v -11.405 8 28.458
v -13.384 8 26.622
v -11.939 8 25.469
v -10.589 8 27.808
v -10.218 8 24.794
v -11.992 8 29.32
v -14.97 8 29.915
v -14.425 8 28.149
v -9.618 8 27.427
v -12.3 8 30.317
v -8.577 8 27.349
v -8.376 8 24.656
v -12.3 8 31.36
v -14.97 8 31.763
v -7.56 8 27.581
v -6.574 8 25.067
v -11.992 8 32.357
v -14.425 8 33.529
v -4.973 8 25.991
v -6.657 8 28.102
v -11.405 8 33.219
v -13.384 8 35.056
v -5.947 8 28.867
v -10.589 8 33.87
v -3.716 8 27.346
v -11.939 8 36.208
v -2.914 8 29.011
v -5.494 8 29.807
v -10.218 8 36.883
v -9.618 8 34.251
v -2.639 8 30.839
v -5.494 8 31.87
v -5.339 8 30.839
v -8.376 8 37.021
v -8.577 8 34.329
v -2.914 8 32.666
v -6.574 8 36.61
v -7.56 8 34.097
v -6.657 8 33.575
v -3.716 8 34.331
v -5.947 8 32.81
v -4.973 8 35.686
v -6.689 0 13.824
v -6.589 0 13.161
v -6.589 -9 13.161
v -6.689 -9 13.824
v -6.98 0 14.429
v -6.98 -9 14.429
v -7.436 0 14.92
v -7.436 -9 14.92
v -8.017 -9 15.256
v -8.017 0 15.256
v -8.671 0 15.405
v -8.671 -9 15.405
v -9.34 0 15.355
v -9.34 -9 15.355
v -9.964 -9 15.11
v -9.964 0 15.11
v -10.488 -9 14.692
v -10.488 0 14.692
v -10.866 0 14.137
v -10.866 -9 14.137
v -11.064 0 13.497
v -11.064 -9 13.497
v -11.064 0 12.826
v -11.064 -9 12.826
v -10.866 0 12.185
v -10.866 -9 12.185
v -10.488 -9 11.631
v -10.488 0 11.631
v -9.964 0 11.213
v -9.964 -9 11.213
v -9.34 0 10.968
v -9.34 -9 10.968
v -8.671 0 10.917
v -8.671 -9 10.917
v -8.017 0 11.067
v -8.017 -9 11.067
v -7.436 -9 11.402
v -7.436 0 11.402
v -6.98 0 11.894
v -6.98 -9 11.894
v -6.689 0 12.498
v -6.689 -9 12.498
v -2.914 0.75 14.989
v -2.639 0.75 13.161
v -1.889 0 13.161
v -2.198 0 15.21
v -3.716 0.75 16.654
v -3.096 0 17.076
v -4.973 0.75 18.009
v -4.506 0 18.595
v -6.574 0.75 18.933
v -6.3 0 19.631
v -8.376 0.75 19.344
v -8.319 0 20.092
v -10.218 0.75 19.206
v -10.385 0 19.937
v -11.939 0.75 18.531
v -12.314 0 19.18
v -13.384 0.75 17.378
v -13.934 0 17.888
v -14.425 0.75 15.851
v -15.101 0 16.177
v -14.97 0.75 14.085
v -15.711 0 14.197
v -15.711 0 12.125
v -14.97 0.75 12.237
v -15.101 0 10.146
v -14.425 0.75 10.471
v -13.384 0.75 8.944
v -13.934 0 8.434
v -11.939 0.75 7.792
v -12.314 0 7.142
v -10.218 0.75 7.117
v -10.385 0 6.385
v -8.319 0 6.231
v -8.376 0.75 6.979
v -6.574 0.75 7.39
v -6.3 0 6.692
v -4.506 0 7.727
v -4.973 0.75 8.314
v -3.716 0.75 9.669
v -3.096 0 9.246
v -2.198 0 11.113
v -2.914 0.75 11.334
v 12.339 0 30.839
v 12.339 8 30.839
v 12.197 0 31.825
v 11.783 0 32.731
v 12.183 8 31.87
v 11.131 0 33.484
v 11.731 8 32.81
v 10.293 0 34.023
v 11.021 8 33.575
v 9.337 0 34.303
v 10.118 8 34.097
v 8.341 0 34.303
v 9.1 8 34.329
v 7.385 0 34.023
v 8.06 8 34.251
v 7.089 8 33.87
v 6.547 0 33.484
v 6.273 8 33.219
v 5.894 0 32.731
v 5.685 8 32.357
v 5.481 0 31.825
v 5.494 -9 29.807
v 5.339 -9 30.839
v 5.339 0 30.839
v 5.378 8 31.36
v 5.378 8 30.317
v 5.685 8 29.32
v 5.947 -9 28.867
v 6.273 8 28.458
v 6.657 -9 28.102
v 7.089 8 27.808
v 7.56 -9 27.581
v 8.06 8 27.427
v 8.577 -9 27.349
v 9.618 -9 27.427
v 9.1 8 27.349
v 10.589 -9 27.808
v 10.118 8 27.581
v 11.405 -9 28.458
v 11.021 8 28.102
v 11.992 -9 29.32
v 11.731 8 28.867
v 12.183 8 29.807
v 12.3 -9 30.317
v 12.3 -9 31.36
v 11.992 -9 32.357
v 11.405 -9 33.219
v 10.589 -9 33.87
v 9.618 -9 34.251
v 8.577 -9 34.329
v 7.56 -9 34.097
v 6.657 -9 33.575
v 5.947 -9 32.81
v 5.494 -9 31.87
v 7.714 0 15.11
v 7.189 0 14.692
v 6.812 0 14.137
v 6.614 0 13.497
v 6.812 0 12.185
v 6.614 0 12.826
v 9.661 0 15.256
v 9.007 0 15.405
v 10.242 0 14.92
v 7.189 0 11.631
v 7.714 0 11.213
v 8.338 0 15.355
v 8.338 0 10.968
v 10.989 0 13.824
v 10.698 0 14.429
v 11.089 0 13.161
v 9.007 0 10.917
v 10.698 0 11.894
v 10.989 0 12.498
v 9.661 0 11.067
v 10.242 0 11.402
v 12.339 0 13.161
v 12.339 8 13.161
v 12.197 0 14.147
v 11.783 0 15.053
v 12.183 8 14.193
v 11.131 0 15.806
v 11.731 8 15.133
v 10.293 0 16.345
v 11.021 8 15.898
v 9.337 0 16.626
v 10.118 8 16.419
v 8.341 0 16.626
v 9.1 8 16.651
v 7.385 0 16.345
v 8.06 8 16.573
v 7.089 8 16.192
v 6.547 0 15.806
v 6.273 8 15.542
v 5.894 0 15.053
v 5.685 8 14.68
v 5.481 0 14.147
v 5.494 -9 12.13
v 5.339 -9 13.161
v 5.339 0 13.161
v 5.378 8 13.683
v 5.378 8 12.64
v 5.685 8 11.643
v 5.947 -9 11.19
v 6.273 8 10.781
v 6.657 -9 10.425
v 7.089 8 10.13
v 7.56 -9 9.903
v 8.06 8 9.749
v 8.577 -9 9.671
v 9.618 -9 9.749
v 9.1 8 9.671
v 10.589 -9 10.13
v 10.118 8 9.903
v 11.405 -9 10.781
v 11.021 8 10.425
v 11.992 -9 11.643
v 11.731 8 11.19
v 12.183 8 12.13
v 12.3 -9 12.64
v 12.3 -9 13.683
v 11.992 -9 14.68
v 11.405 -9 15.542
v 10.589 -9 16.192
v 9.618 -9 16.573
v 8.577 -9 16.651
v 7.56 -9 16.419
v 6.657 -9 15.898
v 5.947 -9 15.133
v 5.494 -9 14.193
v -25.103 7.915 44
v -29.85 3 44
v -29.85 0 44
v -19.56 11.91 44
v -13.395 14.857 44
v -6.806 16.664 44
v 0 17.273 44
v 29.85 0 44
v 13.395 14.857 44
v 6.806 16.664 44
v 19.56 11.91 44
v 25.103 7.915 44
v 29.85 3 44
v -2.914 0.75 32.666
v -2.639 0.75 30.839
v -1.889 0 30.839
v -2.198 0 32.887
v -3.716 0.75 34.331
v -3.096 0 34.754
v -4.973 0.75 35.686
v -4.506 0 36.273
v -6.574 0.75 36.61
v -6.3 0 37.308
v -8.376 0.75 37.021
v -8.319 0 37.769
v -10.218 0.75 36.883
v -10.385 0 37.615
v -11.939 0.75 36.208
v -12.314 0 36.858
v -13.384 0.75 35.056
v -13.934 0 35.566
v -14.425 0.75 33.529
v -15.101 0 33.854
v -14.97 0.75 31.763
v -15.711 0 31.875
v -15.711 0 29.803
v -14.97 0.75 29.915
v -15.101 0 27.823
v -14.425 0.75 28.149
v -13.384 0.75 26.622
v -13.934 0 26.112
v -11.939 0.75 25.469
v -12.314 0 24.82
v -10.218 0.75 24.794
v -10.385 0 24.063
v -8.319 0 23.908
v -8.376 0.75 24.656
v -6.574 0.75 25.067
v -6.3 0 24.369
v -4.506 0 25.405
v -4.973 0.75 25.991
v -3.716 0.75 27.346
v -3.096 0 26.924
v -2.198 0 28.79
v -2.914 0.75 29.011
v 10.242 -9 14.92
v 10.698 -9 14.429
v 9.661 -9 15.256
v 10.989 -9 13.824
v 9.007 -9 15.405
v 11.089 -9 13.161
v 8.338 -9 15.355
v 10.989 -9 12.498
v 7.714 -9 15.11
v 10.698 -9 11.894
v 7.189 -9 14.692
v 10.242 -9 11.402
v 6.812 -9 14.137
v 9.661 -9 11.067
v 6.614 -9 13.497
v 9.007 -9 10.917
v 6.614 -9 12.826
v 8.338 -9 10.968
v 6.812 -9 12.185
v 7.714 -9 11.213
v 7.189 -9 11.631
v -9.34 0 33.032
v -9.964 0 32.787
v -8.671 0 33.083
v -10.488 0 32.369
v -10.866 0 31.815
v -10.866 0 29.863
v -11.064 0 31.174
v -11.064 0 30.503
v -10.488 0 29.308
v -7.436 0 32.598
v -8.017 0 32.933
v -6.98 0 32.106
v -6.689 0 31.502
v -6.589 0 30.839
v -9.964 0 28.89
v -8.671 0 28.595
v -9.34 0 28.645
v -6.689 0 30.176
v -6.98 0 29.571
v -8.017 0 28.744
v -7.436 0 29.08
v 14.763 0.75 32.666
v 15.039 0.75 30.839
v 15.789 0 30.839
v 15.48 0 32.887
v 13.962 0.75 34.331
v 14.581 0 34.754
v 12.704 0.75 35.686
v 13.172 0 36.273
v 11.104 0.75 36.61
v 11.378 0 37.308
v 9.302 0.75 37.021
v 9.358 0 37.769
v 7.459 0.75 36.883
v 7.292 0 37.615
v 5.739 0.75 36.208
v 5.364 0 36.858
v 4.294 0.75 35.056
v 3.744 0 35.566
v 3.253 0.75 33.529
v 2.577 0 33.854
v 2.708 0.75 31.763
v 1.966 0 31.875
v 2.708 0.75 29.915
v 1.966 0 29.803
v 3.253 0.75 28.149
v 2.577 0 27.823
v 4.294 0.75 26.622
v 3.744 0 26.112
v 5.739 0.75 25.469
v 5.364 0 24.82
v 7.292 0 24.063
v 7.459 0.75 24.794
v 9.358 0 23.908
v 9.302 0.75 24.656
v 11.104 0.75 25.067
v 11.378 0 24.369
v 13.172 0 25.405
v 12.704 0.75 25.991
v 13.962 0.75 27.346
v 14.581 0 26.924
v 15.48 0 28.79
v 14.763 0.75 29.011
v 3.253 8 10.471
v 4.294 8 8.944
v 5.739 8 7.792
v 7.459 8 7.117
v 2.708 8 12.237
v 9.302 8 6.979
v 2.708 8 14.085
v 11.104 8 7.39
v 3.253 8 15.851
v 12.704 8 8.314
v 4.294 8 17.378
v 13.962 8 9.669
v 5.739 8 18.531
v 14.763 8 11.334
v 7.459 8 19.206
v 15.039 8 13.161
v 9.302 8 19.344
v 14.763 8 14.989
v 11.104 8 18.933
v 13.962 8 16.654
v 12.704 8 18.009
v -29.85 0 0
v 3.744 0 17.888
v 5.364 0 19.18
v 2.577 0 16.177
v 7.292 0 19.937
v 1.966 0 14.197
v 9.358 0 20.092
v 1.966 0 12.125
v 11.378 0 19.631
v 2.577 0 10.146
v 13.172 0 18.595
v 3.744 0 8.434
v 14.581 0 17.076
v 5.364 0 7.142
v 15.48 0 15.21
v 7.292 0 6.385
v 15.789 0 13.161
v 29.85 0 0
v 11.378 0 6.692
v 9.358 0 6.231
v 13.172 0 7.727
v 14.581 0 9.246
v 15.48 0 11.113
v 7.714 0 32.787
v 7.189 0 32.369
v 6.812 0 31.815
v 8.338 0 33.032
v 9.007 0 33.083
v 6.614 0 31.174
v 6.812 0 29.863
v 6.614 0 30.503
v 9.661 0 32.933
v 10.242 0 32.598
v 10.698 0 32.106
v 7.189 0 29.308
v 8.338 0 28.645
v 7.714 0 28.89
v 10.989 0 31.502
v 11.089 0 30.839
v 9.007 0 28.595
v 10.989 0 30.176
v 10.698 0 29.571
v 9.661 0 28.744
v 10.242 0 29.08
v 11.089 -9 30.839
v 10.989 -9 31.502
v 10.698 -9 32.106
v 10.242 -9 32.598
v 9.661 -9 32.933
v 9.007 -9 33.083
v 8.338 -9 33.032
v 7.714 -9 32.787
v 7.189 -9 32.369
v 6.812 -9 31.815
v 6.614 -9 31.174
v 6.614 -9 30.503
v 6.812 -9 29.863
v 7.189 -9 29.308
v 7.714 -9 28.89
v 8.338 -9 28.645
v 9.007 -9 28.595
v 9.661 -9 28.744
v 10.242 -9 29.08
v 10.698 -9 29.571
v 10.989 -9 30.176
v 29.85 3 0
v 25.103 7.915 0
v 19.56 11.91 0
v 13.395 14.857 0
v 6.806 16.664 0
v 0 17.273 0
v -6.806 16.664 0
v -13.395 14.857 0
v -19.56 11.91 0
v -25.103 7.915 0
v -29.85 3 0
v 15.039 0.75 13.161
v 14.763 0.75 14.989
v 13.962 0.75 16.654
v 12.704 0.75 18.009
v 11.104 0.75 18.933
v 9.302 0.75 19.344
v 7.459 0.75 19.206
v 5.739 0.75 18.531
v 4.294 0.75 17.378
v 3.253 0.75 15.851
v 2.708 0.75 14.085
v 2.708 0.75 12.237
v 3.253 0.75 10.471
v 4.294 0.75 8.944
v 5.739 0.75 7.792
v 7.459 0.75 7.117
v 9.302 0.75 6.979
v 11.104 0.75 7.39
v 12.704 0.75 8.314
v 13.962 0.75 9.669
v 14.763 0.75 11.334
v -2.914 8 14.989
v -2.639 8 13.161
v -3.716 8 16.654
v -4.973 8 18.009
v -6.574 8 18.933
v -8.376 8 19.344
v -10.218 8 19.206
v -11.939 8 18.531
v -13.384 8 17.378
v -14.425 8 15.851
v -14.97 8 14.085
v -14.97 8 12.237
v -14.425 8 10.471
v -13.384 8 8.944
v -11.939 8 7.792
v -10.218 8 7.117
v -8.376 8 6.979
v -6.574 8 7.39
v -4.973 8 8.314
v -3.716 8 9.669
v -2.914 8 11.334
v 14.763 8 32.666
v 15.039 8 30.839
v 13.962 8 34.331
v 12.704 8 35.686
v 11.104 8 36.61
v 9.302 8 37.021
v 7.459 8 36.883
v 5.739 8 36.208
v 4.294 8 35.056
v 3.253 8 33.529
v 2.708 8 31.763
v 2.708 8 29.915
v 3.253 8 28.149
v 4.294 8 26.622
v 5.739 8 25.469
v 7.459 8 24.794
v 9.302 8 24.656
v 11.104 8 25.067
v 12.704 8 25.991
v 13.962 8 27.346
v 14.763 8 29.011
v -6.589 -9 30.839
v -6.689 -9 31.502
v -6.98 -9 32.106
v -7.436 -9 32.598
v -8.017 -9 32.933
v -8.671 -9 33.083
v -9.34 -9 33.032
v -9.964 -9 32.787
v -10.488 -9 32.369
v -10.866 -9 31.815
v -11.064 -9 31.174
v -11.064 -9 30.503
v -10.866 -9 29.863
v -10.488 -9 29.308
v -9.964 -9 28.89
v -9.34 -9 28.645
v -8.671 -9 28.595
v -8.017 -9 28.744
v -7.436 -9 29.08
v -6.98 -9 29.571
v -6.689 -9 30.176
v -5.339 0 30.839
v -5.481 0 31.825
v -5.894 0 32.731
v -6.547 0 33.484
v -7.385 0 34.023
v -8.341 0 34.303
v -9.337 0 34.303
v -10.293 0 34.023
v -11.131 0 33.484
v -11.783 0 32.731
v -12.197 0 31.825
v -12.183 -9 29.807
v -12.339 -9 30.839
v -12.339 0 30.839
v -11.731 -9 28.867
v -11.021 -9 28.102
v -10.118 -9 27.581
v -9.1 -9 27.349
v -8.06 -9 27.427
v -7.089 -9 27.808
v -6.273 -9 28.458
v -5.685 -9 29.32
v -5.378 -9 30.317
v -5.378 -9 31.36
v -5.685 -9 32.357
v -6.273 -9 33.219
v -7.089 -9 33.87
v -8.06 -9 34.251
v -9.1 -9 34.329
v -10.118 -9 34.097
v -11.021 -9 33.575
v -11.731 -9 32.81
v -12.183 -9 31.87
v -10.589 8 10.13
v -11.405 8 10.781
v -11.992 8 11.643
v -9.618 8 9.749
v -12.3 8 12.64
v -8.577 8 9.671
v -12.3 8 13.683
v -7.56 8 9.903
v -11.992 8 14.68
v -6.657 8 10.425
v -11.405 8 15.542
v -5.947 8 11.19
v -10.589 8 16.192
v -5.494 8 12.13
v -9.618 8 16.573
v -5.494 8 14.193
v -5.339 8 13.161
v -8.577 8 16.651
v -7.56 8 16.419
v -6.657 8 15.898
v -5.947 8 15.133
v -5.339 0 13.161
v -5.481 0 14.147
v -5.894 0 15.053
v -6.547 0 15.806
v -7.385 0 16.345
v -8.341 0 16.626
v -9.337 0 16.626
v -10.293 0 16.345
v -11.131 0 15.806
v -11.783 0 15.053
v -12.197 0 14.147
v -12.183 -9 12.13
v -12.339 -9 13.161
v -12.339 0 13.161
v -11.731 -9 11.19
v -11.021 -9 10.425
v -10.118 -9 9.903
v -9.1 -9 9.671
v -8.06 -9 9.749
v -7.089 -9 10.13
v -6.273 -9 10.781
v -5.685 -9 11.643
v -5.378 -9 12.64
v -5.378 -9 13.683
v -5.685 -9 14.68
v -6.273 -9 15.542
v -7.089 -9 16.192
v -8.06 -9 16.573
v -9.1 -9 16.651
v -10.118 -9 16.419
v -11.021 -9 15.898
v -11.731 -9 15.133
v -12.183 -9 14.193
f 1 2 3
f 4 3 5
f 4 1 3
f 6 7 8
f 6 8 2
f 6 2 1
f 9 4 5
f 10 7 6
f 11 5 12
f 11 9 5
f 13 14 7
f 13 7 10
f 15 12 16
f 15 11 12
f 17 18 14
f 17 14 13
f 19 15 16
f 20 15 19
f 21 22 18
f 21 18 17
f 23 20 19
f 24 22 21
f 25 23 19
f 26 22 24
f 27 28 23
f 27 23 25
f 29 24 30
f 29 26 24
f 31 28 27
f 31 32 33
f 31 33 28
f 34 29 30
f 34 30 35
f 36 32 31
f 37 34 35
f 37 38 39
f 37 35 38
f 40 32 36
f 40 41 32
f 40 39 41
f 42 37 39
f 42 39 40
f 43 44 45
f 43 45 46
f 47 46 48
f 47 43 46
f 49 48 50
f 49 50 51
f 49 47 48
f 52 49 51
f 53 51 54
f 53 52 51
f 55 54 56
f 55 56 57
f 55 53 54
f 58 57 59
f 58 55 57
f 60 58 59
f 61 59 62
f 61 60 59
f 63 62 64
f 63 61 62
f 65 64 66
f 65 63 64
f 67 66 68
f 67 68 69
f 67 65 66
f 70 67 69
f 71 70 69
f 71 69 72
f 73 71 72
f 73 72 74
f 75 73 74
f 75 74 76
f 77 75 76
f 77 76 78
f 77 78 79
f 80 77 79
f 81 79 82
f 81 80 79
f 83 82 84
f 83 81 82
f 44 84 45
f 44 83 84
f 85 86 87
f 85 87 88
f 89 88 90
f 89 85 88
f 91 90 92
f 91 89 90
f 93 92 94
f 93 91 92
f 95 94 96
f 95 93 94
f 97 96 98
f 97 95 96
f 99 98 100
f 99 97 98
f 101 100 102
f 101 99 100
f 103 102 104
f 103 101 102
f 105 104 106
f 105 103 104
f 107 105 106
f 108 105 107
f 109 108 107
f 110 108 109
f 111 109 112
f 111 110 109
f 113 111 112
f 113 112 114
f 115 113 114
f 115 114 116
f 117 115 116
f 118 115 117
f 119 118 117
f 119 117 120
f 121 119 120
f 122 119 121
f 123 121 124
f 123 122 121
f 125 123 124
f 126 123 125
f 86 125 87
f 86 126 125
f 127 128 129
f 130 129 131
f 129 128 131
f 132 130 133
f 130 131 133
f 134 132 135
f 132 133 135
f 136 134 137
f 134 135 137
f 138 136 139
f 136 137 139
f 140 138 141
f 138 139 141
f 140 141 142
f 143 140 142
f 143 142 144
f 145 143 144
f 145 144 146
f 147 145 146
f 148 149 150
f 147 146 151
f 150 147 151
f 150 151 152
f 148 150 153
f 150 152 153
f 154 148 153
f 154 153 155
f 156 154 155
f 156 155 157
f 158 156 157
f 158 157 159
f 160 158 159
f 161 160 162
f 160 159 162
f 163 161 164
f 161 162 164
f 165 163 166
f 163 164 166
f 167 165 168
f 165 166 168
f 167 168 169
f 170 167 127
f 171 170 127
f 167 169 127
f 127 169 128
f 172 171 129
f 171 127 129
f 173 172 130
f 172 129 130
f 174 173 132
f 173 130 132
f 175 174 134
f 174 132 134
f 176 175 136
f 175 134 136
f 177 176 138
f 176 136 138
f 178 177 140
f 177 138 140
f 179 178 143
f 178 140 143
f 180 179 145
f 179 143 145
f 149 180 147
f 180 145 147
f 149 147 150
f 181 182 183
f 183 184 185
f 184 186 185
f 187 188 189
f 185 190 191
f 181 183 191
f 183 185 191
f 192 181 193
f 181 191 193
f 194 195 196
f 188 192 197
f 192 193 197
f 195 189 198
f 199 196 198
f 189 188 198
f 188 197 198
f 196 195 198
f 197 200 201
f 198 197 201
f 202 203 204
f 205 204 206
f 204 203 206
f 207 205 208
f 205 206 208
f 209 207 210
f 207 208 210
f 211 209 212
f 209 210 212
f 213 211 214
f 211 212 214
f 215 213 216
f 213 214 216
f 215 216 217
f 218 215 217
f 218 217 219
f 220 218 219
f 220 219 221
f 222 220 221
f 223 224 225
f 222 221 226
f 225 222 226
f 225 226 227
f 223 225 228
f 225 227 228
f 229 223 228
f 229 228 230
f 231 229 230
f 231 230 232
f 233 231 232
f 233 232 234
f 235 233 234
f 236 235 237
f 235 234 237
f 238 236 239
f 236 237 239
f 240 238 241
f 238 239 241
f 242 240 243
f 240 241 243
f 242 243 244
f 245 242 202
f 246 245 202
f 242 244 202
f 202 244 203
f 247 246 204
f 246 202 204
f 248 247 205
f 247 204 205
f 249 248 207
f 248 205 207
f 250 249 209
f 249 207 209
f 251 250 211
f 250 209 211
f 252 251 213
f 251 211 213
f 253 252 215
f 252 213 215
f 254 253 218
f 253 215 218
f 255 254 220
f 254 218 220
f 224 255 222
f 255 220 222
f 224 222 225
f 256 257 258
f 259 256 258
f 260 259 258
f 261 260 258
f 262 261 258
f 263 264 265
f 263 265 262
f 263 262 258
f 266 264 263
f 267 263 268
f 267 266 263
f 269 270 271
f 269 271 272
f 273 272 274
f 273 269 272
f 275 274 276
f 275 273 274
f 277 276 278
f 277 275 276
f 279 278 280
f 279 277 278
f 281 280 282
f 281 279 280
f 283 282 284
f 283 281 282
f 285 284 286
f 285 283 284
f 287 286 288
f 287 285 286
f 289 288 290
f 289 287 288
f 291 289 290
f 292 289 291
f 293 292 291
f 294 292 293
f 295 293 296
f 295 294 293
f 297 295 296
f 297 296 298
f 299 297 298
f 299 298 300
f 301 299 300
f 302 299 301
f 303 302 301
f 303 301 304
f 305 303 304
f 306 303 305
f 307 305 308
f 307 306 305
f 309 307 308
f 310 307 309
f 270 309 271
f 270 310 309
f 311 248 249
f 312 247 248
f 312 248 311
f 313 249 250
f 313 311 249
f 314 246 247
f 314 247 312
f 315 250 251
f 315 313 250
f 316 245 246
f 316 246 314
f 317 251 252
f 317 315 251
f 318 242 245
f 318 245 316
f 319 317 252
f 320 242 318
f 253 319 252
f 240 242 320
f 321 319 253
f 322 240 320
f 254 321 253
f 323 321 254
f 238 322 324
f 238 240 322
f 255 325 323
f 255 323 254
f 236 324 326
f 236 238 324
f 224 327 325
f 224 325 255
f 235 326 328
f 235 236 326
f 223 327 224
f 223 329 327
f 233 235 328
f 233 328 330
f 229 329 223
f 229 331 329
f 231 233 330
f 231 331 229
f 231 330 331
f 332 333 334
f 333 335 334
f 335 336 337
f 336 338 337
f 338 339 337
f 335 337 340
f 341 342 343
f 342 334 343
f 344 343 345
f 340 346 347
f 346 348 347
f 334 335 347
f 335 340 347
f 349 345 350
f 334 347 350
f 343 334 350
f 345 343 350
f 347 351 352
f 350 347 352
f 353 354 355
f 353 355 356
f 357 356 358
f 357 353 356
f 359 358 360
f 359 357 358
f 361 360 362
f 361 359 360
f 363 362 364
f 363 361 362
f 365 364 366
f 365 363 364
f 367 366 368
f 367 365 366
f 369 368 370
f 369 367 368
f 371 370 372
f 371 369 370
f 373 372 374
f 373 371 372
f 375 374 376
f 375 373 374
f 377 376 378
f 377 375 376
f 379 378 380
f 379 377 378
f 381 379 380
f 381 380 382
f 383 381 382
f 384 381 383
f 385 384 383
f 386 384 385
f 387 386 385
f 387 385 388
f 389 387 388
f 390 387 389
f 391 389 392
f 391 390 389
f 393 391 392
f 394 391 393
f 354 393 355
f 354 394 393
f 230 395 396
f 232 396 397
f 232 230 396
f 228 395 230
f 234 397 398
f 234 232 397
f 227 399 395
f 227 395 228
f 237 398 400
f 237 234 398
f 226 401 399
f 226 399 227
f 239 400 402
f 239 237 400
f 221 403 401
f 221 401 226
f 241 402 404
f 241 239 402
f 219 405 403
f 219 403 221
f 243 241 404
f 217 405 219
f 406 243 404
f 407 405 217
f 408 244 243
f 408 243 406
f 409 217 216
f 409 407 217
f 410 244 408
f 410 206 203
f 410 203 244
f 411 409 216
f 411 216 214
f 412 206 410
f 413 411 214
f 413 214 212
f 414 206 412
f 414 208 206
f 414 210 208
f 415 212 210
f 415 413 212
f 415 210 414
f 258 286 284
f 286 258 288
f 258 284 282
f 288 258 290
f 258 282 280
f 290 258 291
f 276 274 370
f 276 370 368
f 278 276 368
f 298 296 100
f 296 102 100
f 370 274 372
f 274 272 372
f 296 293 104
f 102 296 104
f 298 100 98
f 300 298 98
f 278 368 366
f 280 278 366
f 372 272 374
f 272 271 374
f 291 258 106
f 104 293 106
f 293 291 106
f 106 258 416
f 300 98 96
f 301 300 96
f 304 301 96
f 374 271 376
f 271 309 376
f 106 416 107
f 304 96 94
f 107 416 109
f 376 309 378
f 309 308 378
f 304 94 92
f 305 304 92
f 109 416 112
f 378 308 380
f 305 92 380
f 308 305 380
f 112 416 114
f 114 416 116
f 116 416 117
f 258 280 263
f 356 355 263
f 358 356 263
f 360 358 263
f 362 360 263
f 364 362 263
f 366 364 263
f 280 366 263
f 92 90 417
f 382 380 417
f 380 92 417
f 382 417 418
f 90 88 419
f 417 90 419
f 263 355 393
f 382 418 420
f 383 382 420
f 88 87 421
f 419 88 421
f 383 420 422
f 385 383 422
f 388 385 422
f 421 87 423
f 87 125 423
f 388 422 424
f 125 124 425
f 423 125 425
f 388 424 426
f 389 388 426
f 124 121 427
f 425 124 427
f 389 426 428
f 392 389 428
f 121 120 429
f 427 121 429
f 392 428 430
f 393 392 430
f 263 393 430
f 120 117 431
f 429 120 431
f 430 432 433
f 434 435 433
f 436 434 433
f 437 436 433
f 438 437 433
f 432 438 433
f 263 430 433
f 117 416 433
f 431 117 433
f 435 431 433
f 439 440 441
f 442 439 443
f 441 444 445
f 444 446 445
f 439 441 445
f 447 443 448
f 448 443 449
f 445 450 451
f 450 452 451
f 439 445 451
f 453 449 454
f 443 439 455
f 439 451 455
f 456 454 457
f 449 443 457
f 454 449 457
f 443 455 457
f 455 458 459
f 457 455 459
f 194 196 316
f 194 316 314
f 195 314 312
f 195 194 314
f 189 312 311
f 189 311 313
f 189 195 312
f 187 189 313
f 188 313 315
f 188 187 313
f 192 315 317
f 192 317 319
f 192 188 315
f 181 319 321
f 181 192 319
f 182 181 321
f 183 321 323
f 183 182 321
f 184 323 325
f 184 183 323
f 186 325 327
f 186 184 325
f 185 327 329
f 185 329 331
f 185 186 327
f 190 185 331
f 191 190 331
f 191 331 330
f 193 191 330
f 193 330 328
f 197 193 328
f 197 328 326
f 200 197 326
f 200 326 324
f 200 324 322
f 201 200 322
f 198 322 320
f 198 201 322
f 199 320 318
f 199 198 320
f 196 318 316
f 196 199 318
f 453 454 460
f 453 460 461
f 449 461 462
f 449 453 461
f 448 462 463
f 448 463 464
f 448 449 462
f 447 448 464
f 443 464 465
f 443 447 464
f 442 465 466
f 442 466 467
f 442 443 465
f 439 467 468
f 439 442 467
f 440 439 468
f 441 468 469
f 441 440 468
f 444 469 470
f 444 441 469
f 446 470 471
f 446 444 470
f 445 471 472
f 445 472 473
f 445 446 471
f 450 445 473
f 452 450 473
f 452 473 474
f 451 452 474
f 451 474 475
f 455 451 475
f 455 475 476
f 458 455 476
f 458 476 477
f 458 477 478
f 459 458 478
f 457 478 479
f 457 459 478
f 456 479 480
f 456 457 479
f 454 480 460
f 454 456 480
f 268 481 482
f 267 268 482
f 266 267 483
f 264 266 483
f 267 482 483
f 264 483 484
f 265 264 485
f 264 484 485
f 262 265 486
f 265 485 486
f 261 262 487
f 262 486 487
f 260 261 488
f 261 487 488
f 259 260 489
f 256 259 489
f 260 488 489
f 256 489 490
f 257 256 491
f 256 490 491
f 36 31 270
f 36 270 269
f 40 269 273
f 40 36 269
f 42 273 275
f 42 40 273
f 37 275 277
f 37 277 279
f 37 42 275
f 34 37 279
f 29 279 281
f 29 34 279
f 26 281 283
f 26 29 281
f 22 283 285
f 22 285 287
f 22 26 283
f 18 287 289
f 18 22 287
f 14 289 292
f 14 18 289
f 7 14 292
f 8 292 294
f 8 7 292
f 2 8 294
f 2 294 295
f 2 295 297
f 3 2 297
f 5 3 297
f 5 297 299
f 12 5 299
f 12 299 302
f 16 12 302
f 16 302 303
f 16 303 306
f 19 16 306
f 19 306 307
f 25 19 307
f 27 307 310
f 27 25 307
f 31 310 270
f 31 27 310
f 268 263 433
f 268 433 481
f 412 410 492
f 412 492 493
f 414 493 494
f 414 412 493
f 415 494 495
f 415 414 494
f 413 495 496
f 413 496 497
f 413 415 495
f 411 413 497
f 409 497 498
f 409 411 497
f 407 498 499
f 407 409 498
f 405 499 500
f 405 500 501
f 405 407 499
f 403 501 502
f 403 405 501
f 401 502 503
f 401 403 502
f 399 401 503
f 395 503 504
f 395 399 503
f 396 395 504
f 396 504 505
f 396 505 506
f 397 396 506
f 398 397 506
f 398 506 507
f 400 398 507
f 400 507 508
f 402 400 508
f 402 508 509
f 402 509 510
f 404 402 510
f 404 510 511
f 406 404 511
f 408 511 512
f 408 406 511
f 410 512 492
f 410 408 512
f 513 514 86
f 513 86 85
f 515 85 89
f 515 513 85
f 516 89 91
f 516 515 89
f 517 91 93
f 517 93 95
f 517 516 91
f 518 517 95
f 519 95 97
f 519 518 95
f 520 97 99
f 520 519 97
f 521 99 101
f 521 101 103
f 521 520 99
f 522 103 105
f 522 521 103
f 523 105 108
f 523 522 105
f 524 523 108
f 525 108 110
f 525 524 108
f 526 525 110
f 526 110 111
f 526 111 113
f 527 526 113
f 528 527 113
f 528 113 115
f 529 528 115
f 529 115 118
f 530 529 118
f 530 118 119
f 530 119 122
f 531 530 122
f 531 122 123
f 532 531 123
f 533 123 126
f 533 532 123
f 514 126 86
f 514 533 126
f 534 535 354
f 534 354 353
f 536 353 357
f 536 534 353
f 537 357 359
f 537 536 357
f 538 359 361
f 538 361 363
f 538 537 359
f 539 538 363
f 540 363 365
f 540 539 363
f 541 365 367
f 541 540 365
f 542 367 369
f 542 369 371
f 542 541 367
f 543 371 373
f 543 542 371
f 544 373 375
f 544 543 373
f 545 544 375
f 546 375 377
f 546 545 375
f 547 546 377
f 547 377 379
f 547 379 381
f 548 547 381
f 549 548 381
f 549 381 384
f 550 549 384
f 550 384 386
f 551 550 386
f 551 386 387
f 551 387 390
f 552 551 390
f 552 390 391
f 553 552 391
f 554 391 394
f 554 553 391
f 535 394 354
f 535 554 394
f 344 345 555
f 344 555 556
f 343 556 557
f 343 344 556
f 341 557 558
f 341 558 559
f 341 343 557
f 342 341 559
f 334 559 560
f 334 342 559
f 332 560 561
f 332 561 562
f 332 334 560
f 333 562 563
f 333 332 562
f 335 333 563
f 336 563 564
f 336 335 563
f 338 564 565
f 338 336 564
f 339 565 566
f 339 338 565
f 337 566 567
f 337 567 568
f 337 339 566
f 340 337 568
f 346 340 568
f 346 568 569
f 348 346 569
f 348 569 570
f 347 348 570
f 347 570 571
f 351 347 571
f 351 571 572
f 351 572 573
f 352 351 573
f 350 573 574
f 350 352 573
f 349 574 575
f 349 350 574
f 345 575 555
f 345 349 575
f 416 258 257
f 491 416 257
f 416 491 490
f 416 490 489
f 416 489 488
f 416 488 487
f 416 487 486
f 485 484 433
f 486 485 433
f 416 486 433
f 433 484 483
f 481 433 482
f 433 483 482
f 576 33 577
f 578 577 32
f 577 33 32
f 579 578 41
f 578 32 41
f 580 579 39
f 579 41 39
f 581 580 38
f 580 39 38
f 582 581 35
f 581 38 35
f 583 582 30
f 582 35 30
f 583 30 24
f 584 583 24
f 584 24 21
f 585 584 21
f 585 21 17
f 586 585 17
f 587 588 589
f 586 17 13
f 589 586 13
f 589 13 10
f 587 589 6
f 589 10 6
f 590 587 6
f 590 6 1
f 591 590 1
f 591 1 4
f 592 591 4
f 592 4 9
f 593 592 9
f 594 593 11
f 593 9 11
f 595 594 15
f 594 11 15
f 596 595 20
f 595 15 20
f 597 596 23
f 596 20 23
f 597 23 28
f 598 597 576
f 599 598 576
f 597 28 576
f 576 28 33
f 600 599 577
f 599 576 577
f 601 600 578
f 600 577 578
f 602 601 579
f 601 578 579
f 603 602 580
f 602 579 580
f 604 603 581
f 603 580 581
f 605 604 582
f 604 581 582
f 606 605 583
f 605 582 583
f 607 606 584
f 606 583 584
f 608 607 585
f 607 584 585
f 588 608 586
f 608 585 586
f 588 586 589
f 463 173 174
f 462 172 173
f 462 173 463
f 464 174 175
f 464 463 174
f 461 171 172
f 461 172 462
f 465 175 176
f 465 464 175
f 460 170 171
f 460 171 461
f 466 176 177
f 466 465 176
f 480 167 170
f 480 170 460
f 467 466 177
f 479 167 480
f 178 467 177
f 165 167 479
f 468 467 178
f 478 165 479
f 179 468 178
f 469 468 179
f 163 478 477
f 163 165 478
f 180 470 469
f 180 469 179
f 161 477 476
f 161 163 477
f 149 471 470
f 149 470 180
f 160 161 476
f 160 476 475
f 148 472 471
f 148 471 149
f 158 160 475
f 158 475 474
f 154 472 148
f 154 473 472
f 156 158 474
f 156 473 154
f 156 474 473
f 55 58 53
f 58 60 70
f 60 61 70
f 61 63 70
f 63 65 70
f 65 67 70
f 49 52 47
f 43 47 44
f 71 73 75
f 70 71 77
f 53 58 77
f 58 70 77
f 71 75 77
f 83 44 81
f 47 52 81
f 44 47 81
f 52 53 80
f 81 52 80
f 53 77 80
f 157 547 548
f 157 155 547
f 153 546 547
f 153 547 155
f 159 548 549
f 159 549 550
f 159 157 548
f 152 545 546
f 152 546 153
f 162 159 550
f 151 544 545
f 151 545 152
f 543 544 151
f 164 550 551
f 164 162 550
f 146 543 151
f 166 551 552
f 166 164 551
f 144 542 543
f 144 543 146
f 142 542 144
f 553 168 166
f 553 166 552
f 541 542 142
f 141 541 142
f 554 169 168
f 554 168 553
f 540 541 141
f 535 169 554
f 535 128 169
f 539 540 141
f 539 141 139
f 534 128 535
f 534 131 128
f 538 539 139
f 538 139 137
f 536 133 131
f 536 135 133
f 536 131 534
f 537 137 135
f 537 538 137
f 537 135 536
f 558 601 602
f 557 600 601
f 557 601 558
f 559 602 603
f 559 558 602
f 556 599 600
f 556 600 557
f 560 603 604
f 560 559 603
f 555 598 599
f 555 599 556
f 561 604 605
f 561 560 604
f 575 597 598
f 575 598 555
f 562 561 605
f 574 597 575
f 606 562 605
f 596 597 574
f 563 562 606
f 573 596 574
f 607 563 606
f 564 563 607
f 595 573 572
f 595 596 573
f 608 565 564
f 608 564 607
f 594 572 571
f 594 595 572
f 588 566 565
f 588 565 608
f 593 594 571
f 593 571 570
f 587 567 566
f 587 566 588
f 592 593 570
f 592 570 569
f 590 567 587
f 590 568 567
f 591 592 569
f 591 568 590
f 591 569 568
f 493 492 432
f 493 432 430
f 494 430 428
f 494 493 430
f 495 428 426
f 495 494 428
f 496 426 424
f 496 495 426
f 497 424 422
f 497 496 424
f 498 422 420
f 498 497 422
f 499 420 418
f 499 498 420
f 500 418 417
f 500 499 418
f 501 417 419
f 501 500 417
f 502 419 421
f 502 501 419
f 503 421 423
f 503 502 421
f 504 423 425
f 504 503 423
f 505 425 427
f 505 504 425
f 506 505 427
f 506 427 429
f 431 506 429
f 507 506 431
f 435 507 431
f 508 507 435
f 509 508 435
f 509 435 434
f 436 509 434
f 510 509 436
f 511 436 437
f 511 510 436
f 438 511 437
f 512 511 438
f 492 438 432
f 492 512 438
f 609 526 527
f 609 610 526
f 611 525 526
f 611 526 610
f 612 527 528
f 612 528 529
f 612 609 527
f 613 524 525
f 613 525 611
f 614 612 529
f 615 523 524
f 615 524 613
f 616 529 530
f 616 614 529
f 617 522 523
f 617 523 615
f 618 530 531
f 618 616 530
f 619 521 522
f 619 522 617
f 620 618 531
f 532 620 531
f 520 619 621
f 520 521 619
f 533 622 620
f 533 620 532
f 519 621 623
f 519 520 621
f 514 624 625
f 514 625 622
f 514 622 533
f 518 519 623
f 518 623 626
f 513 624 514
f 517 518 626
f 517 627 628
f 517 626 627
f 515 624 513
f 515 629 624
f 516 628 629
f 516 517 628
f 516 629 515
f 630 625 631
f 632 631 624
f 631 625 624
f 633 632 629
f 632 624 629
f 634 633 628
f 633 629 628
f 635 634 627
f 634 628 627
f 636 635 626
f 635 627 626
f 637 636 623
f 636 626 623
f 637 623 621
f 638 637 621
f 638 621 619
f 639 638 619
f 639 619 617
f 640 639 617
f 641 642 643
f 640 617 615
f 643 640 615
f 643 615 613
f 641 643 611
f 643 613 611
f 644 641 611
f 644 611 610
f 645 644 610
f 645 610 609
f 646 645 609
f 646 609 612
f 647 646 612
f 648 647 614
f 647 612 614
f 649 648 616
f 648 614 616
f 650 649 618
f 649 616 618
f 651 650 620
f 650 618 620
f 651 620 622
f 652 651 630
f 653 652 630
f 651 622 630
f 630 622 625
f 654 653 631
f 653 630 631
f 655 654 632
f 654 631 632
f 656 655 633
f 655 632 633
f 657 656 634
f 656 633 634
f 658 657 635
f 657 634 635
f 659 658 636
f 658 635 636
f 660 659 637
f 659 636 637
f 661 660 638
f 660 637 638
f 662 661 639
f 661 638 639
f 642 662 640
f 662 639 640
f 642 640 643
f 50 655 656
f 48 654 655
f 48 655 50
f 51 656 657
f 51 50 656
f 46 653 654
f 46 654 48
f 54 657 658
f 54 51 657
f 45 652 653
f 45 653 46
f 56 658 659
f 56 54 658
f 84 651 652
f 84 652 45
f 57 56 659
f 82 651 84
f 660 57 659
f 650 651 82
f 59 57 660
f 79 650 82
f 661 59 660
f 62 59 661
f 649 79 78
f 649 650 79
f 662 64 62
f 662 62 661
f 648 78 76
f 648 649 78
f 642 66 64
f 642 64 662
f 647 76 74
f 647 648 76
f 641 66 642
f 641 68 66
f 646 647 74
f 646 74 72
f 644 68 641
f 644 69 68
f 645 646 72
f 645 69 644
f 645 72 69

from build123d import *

# Parameters (mm, degrees)
SKETCH1_W           = 59.7
SKETCH1_H           = 3
BOSS_EXTRUDE1_DEPTH = 44
SKETCH2_R           = 3.5
SKETCH2_R_2         = 2.25
BOSS_EXTRUDE2_DEPTH = 9
CUT_EXTRUDE1_START  = -8
SKETCH3_R           = 6.2
SKETCH3_R_2         = 3.5
CUT_EXTRUDE1_DEPTH  = 8
CHAMFER1_SIZE       = 0.75


with BuildPart() as part:
    # Sketch1 → Boss-Extrude1 (new body)
    with BuildSketch(Plane.XY):
        with BuildLine():
            ThreePointArc((29.85, 3), (0, 17.273040059), (-29.85, 3))
            Line((-29.85, 3), (29.85, 3))
        make_face()
        with Locations((0, 1.5)):
            Rectangle(SKETCH1_W, SKETCH1_H)
    extrude(amount=BOSS_EXTRUDE1_DEPTH)

    # Sketch2 → Boss-Extrude2 (add)
    # profile 1 of 4: a face of its own
    with BuildSketch(Plane.XZ):
        with Locations(Location((8.838834765, 30.838834765, 0), (0, 0, 180))):
            Circle(SKETCH2_R)
        with Locations((8.838834765, 30.838834765)):
            Circle(SKETCH2_R_2, mode=Mode.SUBTRACT)
    # profile 2 of 4: a face of its own
    with BuildSketch(Plane.XZ):
        with Locations(Location((8.838834765, 13.161165235, 0), (0, 0, 180))):
            Circle(SKETCH2_R)
        with Locations((8.838834765, 13.161165235)):
            Circle(SKETCH2_R_2, mode=Mode.SUBTRACT)
    # profile 3 of 4: a face of its own
    with BuildSketch(Plane.XZ):
        with Locations(Location((-8.838834765, 13.161165235, 0), (0, 0, 180))):
            Circle(SKETCH2_R)
        with Locations((-8.838834765, 13.161165235)):
            Circle(SKETCH2_R_2, mode=Mode.SUBTRACT)
    # profile 4 of 4: a face of its own
    with BuildSketch(Plane.XZ):
        with Locations(Location((-8.838834765, 30.838834765, 0), (0, 0, 180))):
            Circle(SKETCH2_R)
        with Locations((-8.838834765, 30.838834765)):
            Circle(SKETCH2_R_2, mode=Mode.SUBTRACT)
    extrude(amount=BOSS_EXTRUDE2_DEPTH)

    # Sketch3 → Cut-Extrude1 (cut)
    # profile 1 of 4: a face of its own
    with BuildSketch(Plane.XZ.offset(CUT_EXTRUDE1_START)):
        with Locations((-8.838834765, 30.838834765)):
            Circle(SKETCH3_R)
        with Locations((-8.838834765, 30.838834765)):
            Circle(SKETCH3_R_2, mode=Mode.SUBTRACT)
    # profile 2 of 4: a face of its own
    with BuildSketch(Plane.XZ.offset(CUT_EXTRUDE1_START)):
        with Locations((8.838834765, 30.838834765)):
            Circle(SKETCH3_R)
        with Locations((8.838834765, 30.838834765)):
            Circle(SKETCH3_R_2, mode=Mode.SUBTRACT)
    # profile 3 of 4: a face of its own
    with BuildSketch(Plane.XZ.offset(CUT_EXTRUDE1_START)):
        with Locations((8.838834765, 13.161165235)):
            Circle(SKETCH3_R)
        with Locations((8.838834765, 13.161165235)):
            Circle(SKETCH3_R_2, mode=Mode.SUBTRACT)
    # profile 4 of 4: a face of its own
    with BuildSketch(Plane.XZ.offset(CUT_EXTRUDE1_START)):
        with Locations((-8.838834765, 13.161165235)):
            Circle(SKETCH3_R)
        with Locations((-8.838834765, 13.161165235)):
            Circle(SKETCH3_R_2, mode=Mode.SUBTRACT)
    extrude(amount=CUT_EXTRUDE1_DEPTH, mode=Mode.SUBTRACT)

    # Chamfer1
    chamfer1_edges = [part.edges().sort_by_distance(p)[0] for p in [
        (-15.038834765, 0, 13.161165235),
        (2.638834765, 0, 13.161165235),
        (2.638834765, 0, 30.838834765),
        (-15.038834765, 0, 30.838834765),
    ]]
    chamfer(chamfer1_edges, length=CHAMFER1_SIZE)


solid = part.part
